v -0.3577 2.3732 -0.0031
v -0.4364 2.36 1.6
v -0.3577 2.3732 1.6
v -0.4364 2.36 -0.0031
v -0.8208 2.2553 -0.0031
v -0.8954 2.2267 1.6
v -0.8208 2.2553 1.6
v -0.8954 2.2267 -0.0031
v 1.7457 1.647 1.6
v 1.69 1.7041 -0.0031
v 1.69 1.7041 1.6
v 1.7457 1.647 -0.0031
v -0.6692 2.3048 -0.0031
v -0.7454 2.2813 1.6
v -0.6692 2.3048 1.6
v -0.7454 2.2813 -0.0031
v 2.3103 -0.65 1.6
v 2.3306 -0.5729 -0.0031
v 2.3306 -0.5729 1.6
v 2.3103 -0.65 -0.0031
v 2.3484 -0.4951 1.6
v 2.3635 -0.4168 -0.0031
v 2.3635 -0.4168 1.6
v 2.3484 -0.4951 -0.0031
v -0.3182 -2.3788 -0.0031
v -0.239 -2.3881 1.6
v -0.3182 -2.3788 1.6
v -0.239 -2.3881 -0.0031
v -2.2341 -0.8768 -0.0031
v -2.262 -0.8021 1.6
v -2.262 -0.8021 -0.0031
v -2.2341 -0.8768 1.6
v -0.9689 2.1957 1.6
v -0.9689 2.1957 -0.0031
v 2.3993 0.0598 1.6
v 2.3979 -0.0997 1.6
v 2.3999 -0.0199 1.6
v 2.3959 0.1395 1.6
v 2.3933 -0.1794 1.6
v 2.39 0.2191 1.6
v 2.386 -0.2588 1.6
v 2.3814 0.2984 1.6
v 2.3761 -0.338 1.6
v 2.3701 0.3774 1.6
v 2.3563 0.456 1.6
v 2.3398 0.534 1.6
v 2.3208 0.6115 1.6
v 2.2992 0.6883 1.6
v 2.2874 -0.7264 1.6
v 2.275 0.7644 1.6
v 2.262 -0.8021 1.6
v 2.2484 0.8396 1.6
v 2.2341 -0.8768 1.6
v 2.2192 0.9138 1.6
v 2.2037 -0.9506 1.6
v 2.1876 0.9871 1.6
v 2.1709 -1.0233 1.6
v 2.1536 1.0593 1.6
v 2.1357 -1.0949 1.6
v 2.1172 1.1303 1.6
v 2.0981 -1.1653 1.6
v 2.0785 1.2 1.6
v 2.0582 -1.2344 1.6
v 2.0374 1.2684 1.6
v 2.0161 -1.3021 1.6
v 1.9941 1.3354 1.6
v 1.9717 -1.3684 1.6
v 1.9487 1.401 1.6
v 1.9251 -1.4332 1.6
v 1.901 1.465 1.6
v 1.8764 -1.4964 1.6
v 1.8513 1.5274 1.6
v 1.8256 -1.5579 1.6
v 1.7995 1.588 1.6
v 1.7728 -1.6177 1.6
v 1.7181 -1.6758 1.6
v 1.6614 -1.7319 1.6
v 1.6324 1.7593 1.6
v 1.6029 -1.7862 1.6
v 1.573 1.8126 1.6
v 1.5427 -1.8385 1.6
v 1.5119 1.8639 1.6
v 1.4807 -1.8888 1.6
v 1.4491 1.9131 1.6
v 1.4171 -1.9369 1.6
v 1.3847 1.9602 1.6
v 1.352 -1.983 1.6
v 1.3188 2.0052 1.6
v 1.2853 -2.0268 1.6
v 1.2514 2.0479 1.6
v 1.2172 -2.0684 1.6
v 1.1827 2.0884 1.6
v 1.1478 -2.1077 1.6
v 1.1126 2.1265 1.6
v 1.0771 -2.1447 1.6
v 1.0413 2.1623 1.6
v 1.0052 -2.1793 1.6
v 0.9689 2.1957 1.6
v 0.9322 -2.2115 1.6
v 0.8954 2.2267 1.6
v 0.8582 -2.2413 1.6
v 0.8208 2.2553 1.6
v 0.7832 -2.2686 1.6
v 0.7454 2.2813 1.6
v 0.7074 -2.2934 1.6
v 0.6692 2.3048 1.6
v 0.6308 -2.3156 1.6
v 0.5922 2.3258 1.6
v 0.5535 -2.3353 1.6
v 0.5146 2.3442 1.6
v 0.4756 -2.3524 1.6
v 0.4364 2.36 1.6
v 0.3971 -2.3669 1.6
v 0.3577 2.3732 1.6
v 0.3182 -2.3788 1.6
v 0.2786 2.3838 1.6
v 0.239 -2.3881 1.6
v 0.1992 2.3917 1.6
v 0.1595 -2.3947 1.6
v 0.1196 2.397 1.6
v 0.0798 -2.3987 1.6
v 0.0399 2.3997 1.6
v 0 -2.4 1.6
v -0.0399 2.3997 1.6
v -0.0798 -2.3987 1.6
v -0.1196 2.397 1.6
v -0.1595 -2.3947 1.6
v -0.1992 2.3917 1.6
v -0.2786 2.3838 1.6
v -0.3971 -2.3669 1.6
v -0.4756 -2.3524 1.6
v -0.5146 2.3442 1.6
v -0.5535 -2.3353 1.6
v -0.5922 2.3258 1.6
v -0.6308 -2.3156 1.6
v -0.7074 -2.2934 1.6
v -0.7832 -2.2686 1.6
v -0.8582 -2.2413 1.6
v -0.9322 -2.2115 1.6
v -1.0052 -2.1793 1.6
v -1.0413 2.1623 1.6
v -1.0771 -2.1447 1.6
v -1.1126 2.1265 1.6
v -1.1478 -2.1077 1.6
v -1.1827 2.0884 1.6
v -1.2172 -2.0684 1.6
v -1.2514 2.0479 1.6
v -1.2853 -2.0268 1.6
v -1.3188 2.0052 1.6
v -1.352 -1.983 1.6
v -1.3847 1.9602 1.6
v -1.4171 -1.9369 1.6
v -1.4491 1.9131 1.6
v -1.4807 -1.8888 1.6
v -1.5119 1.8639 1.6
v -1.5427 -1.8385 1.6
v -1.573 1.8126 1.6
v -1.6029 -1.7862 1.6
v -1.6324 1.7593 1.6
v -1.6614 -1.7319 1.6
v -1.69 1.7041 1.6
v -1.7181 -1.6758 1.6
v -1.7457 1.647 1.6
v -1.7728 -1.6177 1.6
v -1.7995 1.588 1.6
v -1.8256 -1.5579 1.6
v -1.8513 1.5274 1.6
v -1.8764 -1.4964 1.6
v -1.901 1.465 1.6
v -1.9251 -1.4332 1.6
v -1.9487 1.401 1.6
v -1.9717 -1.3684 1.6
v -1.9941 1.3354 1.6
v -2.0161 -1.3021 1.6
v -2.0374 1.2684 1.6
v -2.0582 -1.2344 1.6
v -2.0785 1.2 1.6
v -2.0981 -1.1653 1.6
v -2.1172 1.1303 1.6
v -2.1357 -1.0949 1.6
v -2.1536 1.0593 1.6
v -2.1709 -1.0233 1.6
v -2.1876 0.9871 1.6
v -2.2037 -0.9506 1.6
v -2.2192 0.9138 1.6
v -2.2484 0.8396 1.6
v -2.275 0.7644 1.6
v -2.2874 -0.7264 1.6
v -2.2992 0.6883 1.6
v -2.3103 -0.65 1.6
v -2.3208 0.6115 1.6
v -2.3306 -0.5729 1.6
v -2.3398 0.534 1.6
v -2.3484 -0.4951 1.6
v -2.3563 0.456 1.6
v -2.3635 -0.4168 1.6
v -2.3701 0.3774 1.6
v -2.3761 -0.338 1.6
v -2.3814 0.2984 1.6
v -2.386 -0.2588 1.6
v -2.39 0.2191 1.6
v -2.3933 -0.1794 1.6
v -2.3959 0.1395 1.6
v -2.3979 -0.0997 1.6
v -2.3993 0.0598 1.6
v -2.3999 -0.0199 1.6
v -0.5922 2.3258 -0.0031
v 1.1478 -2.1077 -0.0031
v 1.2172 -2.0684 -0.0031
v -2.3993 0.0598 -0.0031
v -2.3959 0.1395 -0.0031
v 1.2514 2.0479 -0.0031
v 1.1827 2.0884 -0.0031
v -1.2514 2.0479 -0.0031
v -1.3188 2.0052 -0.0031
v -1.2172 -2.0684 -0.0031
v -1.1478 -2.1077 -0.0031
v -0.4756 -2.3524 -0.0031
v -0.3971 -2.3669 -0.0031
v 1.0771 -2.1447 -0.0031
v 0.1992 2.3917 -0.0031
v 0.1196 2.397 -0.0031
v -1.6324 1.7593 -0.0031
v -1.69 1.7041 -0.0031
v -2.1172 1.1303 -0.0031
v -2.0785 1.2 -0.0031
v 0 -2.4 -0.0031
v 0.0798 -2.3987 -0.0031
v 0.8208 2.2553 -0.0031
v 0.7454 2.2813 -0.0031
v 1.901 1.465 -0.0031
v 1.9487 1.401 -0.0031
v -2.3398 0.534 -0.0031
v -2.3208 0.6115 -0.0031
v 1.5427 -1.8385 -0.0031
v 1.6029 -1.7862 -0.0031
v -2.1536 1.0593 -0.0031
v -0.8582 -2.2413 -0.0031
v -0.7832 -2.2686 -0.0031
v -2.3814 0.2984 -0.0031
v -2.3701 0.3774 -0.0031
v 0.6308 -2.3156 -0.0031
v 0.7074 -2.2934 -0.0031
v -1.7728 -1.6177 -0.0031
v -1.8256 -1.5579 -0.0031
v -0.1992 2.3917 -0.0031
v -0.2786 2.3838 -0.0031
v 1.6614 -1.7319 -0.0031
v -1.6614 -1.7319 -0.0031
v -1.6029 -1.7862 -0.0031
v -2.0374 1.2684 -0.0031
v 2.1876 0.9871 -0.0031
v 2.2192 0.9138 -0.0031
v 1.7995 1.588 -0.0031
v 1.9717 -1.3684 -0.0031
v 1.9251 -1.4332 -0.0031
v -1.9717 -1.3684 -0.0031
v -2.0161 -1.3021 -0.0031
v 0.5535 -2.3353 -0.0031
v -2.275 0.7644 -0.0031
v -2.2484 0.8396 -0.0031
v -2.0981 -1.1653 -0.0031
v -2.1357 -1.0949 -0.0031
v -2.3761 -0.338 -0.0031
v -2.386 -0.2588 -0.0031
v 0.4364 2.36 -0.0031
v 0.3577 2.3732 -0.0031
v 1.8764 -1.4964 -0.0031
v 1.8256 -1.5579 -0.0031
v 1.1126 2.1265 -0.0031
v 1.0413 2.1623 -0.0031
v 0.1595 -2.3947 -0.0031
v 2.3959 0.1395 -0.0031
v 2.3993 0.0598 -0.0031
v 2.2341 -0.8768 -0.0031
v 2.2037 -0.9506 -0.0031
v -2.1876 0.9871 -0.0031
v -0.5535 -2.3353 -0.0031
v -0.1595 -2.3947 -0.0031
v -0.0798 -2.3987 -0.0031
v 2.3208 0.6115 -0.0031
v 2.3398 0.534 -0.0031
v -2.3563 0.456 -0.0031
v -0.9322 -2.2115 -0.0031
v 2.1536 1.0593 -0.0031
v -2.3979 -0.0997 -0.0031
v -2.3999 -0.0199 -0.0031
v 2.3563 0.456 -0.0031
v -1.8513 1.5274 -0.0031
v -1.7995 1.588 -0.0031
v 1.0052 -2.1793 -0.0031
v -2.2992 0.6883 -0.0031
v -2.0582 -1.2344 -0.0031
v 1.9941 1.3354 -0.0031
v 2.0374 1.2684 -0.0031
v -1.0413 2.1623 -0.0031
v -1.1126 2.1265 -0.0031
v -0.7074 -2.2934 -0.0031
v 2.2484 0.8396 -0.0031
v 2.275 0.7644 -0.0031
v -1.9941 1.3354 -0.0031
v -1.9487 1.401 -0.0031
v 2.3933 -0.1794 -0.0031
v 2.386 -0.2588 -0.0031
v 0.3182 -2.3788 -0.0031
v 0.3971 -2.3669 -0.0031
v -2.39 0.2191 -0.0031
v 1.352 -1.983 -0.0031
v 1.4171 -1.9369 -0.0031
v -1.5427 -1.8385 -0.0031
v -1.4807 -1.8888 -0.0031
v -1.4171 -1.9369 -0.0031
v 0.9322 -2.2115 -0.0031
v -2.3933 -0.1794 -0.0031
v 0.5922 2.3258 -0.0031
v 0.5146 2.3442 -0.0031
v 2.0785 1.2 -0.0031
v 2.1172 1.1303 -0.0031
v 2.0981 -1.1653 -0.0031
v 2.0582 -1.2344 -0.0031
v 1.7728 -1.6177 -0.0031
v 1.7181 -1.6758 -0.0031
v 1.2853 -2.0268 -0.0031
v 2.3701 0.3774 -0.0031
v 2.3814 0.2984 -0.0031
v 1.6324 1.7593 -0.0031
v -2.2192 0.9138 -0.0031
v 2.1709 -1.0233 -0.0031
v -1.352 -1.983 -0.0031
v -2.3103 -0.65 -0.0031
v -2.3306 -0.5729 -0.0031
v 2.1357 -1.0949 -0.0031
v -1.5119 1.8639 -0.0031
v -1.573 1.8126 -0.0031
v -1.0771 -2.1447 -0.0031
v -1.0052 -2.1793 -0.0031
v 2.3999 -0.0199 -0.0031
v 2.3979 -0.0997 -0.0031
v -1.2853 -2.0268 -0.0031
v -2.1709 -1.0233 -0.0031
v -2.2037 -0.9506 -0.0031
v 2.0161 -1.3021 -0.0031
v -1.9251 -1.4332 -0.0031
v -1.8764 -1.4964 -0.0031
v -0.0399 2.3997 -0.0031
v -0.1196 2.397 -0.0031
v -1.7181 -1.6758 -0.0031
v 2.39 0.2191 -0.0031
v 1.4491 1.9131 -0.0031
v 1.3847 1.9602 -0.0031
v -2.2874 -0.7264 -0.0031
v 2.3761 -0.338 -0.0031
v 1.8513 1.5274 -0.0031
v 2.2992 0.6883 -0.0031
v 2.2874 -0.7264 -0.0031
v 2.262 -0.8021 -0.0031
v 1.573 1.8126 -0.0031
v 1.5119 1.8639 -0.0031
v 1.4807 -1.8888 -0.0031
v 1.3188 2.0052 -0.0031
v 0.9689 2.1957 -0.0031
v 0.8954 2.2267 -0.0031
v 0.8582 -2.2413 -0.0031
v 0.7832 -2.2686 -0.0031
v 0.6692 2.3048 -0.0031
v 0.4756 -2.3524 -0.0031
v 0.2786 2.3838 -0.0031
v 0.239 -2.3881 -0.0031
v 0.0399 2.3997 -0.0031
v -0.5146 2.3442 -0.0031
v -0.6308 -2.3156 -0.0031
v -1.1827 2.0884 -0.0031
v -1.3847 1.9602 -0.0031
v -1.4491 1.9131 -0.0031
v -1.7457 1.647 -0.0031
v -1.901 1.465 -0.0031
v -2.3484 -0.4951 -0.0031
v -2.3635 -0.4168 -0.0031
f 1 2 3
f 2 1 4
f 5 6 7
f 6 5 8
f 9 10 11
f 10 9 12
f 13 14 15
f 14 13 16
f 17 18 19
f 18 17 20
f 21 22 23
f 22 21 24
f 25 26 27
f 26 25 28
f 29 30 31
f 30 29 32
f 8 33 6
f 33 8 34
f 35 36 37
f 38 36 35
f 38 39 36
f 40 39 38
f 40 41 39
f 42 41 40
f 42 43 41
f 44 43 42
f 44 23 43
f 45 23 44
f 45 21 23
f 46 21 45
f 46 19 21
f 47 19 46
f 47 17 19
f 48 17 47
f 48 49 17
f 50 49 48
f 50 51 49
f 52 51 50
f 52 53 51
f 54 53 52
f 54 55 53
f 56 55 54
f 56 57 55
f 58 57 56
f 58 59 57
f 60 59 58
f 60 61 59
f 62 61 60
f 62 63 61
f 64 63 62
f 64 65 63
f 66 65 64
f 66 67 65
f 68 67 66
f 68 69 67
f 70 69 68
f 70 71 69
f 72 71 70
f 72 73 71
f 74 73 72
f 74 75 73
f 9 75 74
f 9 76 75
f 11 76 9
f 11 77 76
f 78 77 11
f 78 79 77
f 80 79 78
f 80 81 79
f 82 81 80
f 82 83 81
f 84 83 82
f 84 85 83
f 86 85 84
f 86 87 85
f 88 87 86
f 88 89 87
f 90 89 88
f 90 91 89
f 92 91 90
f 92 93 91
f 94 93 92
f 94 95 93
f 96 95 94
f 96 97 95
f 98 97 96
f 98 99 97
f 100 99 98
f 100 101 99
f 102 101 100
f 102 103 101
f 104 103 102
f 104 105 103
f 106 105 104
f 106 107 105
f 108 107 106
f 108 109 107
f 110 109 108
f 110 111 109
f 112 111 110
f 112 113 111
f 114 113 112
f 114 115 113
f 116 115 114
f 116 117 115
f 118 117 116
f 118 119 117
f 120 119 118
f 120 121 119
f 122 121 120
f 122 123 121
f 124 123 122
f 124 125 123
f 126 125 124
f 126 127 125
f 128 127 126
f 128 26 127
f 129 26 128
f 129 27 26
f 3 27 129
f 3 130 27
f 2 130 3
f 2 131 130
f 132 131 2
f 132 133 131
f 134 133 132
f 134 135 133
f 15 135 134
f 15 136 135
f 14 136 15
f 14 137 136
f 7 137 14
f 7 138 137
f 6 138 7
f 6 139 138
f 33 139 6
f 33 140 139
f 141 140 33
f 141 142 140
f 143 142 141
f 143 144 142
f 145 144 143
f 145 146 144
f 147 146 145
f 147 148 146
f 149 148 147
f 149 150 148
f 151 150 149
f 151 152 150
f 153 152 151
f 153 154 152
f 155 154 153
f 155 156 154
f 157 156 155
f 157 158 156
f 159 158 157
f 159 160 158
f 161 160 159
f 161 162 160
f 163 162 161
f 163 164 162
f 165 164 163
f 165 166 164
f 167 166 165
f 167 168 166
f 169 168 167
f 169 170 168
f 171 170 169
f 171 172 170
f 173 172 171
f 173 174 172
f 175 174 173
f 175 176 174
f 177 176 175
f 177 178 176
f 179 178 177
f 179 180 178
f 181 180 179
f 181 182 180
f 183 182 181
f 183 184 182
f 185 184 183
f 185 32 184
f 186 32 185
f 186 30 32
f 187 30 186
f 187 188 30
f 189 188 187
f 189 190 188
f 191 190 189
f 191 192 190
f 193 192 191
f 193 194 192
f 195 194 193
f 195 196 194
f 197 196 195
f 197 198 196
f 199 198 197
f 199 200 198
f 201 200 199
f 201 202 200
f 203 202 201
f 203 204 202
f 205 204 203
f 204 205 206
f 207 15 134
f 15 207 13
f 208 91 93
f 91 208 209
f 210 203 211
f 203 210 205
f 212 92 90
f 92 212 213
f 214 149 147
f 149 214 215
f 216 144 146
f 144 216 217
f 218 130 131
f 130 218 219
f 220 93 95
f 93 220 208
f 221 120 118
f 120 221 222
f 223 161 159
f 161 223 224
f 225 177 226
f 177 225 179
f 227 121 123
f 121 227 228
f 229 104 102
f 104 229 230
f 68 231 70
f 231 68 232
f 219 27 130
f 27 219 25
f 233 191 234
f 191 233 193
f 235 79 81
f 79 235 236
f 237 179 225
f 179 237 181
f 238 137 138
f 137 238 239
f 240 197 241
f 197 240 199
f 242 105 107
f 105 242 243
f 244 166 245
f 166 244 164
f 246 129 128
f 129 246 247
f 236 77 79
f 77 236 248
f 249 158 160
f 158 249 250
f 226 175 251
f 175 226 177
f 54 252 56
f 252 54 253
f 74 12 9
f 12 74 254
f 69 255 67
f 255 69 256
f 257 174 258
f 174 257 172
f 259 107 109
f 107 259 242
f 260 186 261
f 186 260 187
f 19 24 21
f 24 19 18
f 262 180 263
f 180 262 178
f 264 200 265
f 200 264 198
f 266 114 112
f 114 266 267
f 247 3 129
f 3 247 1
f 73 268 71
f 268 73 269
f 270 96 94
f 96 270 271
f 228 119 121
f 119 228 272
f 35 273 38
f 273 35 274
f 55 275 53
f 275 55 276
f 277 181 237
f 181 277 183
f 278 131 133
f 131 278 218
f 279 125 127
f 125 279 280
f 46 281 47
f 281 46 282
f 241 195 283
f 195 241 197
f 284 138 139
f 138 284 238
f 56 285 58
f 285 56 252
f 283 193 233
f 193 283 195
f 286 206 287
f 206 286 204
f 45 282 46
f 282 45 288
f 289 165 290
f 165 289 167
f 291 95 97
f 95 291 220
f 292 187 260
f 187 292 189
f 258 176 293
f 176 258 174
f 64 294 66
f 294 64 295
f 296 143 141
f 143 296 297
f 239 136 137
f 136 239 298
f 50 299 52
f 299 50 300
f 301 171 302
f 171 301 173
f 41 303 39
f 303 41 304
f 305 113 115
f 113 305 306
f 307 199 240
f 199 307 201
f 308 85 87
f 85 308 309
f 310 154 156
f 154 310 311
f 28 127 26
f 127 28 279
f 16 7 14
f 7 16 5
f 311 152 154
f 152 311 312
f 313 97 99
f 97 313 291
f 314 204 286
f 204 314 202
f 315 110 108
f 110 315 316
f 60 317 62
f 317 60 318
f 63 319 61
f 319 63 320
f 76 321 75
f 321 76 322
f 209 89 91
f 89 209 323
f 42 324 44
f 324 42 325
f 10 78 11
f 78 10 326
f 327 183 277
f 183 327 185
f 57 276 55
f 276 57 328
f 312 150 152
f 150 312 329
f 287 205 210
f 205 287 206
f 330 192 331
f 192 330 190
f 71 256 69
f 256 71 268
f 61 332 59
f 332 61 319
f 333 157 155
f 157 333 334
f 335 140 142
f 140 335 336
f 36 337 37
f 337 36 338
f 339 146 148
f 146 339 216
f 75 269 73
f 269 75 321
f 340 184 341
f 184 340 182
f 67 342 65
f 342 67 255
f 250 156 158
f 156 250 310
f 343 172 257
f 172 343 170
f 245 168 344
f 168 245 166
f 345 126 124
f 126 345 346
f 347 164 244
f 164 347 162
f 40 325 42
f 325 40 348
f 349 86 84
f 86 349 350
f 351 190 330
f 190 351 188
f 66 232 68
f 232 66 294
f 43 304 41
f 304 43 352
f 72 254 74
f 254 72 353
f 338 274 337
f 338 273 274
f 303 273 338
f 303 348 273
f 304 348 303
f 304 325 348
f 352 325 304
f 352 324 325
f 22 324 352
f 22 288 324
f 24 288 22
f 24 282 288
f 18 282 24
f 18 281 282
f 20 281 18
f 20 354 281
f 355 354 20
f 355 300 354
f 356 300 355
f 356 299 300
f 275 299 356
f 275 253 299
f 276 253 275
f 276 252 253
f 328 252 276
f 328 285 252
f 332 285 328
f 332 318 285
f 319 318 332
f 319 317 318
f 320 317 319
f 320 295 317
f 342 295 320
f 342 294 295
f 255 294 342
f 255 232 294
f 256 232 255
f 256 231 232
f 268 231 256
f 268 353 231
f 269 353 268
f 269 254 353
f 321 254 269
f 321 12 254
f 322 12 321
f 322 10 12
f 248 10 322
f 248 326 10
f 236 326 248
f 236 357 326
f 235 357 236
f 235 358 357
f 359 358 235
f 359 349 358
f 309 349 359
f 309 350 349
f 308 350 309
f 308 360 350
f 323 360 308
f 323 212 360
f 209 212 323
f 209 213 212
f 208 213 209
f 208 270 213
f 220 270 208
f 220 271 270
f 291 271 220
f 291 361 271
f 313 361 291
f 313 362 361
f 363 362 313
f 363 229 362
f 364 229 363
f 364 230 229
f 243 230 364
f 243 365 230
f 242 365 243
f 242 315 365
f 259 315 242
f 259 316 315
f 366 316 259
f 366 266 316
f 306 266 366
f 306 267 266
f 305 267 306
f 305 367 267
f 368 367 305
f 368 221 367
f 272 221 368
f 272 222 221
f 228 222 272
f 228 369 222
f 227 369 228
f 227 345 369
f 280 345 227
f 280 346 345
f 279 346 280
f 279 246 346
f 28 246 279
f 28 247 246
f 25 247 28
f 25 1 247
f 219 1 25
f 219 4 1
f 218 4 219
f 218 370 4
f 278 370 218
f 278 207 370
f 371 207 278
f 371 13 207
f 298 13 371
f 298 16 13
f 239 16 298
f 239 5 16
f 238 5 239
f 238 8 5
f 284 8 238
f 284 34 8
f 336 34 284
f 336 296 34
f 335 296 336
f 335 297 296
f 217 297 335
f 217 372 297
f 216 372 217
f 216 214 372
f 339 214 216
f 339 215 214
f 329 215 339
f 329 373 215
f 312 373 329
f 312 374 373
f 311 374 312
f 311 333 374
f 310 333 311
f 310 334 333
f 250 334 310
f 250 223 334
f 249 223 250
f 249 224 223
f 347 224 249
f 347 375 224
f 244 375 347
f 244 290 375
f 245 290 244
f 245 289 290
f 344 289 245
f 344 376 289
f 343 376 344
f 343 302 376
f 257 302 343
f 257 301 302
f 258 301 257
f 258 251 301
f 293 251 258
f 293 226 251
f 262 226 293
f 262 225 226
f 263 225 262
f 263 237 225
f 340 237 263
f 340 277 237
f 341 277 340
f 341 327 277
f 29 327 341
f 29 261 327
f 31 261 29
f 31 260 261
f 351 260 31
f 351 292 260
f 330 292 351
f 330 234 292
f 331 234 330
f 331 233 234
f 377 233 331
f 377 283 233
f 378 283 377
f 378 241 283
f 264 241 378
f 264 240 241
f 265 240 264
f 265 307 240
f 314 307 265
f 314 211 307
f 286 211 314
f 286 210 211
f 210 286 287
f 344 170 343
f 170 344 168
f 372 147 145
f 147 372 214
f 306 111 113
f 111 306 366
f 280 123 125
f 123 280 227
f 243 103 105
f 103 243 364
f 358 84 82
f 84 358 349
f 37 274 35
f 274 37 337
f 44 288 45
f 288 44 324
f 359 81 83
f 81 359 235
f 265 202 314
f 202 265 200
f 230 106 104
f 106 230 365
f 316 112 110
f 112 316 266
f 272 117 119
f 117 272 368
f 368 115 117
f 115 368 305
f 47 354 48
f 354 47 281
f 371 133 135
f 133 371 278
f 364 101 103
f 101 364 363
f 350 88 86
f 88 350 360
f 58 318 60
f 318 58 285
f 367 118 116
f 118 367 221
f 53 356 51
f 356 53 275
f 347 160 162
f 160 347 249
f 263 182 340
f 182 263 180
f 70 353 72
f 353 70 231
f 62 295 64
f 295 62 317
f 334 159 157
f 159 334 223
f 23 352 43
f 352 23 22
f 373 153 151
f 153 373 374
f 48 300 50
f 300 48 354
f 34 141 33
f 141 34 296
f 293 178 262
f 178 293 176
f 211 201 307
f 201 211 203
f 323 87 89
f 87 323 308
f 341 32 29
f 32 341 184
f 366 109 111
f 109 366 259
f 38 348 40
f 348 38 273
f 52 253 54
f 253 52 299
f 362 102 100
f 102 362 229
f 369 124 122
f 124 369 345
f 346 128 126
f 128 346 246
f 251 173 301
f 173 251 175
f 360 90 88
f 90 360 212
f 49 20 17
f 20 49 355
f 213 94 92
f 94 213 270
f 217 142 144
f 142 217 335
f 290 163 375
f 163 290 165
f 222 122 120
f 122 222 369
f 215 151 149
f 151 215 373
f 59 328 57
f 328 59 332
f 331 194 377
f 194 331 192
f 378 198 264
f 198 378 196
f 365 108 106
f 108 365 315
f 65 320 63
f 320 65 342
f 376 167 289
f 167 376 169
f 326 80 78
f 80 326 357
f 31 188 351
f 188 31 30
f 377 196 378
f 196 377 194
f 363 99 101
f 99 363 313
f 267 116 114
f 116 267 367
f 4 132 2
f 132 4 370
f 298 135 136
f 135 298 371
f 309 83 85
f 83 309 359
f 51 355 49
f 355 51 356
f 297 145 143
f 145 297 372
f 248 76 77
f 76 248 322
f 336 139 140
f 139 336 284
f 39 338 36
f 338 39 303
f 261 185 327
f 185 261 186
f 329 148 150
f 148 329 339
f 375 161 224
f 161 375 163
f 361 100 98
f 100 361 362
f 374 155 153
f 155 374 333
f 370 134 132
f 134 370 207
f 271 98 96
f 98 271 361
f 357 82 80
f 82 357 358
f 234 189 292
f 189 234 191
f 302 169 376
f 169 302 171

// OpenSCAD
use <../lib.scad>
use <s/3193as01.scad>
use <../p/stud.scad>
$fa=1; $fs=0.2;
function ldraw_lib__3192a(realsolid=false) = [
// 0 Door  1 x  3 x  4 Right with Vertical Handle with Grip
// 0 Name: 3192a.dat
// 0 Author: James Jessiman
// 0 !LDRAW_ORG Part UPDATE 2020-01
// 0 !LICENSE Licensed under CC BY 2.0 and CC BY 4.0 : see CAreadme.txt
// 
// 0 BFC CERTIFY CCW
  [0,"BFC","CERTIFY"],
  [0,"BFC","CCW"],
// 
// 0 !HISTORY 2007-07-04 [PTadmin] Header formatted for Contributor Agreement
// 0 !HISTORY 2008-07-01 [PTadmin] Official Update 2008-01
// 0 !HISTORY 2010-02-15 [PTadmin] Renamed from 446, but 3192 was erroneously used for 1x3x3 door
// 0 !HISTORY 2010-02-15 [Steffen] used subfile
// 0 !HISTORY 2010-07-05 [PTadmin] Official Update 2010-02
// 0 !HISTORY 2020-06-28 [PTadmin] Official Update 2020-01
// 
// 
// 1 16 0 0 0 -1 0 0 0 1 0 0 0 1 s\3193as01.dat
  [1,16,0,0,0,-1,0,0,0,1,0,0,0,1, ldraw_lib__s__3193as01(realsolid)],
// 1 16 0 0 0 1 0 0 0 1 0 0 0 1 stud.dat
  [1,16,0,0,0,1,0,0,0,1,0,0,0,1, ldraw_lib__stud(realsolid)],
];
module ldraw_lib__3192a(step=0, col=false, unit=2/5, alt=false, line=0.2, solid=!$preview)
    makepoly(ldraw_lib__3192a(solid), step=step, col=col, unit=unit, alt=alt, line=line, solid=solid);
ldraw_lib__3192a(line=0.2);
